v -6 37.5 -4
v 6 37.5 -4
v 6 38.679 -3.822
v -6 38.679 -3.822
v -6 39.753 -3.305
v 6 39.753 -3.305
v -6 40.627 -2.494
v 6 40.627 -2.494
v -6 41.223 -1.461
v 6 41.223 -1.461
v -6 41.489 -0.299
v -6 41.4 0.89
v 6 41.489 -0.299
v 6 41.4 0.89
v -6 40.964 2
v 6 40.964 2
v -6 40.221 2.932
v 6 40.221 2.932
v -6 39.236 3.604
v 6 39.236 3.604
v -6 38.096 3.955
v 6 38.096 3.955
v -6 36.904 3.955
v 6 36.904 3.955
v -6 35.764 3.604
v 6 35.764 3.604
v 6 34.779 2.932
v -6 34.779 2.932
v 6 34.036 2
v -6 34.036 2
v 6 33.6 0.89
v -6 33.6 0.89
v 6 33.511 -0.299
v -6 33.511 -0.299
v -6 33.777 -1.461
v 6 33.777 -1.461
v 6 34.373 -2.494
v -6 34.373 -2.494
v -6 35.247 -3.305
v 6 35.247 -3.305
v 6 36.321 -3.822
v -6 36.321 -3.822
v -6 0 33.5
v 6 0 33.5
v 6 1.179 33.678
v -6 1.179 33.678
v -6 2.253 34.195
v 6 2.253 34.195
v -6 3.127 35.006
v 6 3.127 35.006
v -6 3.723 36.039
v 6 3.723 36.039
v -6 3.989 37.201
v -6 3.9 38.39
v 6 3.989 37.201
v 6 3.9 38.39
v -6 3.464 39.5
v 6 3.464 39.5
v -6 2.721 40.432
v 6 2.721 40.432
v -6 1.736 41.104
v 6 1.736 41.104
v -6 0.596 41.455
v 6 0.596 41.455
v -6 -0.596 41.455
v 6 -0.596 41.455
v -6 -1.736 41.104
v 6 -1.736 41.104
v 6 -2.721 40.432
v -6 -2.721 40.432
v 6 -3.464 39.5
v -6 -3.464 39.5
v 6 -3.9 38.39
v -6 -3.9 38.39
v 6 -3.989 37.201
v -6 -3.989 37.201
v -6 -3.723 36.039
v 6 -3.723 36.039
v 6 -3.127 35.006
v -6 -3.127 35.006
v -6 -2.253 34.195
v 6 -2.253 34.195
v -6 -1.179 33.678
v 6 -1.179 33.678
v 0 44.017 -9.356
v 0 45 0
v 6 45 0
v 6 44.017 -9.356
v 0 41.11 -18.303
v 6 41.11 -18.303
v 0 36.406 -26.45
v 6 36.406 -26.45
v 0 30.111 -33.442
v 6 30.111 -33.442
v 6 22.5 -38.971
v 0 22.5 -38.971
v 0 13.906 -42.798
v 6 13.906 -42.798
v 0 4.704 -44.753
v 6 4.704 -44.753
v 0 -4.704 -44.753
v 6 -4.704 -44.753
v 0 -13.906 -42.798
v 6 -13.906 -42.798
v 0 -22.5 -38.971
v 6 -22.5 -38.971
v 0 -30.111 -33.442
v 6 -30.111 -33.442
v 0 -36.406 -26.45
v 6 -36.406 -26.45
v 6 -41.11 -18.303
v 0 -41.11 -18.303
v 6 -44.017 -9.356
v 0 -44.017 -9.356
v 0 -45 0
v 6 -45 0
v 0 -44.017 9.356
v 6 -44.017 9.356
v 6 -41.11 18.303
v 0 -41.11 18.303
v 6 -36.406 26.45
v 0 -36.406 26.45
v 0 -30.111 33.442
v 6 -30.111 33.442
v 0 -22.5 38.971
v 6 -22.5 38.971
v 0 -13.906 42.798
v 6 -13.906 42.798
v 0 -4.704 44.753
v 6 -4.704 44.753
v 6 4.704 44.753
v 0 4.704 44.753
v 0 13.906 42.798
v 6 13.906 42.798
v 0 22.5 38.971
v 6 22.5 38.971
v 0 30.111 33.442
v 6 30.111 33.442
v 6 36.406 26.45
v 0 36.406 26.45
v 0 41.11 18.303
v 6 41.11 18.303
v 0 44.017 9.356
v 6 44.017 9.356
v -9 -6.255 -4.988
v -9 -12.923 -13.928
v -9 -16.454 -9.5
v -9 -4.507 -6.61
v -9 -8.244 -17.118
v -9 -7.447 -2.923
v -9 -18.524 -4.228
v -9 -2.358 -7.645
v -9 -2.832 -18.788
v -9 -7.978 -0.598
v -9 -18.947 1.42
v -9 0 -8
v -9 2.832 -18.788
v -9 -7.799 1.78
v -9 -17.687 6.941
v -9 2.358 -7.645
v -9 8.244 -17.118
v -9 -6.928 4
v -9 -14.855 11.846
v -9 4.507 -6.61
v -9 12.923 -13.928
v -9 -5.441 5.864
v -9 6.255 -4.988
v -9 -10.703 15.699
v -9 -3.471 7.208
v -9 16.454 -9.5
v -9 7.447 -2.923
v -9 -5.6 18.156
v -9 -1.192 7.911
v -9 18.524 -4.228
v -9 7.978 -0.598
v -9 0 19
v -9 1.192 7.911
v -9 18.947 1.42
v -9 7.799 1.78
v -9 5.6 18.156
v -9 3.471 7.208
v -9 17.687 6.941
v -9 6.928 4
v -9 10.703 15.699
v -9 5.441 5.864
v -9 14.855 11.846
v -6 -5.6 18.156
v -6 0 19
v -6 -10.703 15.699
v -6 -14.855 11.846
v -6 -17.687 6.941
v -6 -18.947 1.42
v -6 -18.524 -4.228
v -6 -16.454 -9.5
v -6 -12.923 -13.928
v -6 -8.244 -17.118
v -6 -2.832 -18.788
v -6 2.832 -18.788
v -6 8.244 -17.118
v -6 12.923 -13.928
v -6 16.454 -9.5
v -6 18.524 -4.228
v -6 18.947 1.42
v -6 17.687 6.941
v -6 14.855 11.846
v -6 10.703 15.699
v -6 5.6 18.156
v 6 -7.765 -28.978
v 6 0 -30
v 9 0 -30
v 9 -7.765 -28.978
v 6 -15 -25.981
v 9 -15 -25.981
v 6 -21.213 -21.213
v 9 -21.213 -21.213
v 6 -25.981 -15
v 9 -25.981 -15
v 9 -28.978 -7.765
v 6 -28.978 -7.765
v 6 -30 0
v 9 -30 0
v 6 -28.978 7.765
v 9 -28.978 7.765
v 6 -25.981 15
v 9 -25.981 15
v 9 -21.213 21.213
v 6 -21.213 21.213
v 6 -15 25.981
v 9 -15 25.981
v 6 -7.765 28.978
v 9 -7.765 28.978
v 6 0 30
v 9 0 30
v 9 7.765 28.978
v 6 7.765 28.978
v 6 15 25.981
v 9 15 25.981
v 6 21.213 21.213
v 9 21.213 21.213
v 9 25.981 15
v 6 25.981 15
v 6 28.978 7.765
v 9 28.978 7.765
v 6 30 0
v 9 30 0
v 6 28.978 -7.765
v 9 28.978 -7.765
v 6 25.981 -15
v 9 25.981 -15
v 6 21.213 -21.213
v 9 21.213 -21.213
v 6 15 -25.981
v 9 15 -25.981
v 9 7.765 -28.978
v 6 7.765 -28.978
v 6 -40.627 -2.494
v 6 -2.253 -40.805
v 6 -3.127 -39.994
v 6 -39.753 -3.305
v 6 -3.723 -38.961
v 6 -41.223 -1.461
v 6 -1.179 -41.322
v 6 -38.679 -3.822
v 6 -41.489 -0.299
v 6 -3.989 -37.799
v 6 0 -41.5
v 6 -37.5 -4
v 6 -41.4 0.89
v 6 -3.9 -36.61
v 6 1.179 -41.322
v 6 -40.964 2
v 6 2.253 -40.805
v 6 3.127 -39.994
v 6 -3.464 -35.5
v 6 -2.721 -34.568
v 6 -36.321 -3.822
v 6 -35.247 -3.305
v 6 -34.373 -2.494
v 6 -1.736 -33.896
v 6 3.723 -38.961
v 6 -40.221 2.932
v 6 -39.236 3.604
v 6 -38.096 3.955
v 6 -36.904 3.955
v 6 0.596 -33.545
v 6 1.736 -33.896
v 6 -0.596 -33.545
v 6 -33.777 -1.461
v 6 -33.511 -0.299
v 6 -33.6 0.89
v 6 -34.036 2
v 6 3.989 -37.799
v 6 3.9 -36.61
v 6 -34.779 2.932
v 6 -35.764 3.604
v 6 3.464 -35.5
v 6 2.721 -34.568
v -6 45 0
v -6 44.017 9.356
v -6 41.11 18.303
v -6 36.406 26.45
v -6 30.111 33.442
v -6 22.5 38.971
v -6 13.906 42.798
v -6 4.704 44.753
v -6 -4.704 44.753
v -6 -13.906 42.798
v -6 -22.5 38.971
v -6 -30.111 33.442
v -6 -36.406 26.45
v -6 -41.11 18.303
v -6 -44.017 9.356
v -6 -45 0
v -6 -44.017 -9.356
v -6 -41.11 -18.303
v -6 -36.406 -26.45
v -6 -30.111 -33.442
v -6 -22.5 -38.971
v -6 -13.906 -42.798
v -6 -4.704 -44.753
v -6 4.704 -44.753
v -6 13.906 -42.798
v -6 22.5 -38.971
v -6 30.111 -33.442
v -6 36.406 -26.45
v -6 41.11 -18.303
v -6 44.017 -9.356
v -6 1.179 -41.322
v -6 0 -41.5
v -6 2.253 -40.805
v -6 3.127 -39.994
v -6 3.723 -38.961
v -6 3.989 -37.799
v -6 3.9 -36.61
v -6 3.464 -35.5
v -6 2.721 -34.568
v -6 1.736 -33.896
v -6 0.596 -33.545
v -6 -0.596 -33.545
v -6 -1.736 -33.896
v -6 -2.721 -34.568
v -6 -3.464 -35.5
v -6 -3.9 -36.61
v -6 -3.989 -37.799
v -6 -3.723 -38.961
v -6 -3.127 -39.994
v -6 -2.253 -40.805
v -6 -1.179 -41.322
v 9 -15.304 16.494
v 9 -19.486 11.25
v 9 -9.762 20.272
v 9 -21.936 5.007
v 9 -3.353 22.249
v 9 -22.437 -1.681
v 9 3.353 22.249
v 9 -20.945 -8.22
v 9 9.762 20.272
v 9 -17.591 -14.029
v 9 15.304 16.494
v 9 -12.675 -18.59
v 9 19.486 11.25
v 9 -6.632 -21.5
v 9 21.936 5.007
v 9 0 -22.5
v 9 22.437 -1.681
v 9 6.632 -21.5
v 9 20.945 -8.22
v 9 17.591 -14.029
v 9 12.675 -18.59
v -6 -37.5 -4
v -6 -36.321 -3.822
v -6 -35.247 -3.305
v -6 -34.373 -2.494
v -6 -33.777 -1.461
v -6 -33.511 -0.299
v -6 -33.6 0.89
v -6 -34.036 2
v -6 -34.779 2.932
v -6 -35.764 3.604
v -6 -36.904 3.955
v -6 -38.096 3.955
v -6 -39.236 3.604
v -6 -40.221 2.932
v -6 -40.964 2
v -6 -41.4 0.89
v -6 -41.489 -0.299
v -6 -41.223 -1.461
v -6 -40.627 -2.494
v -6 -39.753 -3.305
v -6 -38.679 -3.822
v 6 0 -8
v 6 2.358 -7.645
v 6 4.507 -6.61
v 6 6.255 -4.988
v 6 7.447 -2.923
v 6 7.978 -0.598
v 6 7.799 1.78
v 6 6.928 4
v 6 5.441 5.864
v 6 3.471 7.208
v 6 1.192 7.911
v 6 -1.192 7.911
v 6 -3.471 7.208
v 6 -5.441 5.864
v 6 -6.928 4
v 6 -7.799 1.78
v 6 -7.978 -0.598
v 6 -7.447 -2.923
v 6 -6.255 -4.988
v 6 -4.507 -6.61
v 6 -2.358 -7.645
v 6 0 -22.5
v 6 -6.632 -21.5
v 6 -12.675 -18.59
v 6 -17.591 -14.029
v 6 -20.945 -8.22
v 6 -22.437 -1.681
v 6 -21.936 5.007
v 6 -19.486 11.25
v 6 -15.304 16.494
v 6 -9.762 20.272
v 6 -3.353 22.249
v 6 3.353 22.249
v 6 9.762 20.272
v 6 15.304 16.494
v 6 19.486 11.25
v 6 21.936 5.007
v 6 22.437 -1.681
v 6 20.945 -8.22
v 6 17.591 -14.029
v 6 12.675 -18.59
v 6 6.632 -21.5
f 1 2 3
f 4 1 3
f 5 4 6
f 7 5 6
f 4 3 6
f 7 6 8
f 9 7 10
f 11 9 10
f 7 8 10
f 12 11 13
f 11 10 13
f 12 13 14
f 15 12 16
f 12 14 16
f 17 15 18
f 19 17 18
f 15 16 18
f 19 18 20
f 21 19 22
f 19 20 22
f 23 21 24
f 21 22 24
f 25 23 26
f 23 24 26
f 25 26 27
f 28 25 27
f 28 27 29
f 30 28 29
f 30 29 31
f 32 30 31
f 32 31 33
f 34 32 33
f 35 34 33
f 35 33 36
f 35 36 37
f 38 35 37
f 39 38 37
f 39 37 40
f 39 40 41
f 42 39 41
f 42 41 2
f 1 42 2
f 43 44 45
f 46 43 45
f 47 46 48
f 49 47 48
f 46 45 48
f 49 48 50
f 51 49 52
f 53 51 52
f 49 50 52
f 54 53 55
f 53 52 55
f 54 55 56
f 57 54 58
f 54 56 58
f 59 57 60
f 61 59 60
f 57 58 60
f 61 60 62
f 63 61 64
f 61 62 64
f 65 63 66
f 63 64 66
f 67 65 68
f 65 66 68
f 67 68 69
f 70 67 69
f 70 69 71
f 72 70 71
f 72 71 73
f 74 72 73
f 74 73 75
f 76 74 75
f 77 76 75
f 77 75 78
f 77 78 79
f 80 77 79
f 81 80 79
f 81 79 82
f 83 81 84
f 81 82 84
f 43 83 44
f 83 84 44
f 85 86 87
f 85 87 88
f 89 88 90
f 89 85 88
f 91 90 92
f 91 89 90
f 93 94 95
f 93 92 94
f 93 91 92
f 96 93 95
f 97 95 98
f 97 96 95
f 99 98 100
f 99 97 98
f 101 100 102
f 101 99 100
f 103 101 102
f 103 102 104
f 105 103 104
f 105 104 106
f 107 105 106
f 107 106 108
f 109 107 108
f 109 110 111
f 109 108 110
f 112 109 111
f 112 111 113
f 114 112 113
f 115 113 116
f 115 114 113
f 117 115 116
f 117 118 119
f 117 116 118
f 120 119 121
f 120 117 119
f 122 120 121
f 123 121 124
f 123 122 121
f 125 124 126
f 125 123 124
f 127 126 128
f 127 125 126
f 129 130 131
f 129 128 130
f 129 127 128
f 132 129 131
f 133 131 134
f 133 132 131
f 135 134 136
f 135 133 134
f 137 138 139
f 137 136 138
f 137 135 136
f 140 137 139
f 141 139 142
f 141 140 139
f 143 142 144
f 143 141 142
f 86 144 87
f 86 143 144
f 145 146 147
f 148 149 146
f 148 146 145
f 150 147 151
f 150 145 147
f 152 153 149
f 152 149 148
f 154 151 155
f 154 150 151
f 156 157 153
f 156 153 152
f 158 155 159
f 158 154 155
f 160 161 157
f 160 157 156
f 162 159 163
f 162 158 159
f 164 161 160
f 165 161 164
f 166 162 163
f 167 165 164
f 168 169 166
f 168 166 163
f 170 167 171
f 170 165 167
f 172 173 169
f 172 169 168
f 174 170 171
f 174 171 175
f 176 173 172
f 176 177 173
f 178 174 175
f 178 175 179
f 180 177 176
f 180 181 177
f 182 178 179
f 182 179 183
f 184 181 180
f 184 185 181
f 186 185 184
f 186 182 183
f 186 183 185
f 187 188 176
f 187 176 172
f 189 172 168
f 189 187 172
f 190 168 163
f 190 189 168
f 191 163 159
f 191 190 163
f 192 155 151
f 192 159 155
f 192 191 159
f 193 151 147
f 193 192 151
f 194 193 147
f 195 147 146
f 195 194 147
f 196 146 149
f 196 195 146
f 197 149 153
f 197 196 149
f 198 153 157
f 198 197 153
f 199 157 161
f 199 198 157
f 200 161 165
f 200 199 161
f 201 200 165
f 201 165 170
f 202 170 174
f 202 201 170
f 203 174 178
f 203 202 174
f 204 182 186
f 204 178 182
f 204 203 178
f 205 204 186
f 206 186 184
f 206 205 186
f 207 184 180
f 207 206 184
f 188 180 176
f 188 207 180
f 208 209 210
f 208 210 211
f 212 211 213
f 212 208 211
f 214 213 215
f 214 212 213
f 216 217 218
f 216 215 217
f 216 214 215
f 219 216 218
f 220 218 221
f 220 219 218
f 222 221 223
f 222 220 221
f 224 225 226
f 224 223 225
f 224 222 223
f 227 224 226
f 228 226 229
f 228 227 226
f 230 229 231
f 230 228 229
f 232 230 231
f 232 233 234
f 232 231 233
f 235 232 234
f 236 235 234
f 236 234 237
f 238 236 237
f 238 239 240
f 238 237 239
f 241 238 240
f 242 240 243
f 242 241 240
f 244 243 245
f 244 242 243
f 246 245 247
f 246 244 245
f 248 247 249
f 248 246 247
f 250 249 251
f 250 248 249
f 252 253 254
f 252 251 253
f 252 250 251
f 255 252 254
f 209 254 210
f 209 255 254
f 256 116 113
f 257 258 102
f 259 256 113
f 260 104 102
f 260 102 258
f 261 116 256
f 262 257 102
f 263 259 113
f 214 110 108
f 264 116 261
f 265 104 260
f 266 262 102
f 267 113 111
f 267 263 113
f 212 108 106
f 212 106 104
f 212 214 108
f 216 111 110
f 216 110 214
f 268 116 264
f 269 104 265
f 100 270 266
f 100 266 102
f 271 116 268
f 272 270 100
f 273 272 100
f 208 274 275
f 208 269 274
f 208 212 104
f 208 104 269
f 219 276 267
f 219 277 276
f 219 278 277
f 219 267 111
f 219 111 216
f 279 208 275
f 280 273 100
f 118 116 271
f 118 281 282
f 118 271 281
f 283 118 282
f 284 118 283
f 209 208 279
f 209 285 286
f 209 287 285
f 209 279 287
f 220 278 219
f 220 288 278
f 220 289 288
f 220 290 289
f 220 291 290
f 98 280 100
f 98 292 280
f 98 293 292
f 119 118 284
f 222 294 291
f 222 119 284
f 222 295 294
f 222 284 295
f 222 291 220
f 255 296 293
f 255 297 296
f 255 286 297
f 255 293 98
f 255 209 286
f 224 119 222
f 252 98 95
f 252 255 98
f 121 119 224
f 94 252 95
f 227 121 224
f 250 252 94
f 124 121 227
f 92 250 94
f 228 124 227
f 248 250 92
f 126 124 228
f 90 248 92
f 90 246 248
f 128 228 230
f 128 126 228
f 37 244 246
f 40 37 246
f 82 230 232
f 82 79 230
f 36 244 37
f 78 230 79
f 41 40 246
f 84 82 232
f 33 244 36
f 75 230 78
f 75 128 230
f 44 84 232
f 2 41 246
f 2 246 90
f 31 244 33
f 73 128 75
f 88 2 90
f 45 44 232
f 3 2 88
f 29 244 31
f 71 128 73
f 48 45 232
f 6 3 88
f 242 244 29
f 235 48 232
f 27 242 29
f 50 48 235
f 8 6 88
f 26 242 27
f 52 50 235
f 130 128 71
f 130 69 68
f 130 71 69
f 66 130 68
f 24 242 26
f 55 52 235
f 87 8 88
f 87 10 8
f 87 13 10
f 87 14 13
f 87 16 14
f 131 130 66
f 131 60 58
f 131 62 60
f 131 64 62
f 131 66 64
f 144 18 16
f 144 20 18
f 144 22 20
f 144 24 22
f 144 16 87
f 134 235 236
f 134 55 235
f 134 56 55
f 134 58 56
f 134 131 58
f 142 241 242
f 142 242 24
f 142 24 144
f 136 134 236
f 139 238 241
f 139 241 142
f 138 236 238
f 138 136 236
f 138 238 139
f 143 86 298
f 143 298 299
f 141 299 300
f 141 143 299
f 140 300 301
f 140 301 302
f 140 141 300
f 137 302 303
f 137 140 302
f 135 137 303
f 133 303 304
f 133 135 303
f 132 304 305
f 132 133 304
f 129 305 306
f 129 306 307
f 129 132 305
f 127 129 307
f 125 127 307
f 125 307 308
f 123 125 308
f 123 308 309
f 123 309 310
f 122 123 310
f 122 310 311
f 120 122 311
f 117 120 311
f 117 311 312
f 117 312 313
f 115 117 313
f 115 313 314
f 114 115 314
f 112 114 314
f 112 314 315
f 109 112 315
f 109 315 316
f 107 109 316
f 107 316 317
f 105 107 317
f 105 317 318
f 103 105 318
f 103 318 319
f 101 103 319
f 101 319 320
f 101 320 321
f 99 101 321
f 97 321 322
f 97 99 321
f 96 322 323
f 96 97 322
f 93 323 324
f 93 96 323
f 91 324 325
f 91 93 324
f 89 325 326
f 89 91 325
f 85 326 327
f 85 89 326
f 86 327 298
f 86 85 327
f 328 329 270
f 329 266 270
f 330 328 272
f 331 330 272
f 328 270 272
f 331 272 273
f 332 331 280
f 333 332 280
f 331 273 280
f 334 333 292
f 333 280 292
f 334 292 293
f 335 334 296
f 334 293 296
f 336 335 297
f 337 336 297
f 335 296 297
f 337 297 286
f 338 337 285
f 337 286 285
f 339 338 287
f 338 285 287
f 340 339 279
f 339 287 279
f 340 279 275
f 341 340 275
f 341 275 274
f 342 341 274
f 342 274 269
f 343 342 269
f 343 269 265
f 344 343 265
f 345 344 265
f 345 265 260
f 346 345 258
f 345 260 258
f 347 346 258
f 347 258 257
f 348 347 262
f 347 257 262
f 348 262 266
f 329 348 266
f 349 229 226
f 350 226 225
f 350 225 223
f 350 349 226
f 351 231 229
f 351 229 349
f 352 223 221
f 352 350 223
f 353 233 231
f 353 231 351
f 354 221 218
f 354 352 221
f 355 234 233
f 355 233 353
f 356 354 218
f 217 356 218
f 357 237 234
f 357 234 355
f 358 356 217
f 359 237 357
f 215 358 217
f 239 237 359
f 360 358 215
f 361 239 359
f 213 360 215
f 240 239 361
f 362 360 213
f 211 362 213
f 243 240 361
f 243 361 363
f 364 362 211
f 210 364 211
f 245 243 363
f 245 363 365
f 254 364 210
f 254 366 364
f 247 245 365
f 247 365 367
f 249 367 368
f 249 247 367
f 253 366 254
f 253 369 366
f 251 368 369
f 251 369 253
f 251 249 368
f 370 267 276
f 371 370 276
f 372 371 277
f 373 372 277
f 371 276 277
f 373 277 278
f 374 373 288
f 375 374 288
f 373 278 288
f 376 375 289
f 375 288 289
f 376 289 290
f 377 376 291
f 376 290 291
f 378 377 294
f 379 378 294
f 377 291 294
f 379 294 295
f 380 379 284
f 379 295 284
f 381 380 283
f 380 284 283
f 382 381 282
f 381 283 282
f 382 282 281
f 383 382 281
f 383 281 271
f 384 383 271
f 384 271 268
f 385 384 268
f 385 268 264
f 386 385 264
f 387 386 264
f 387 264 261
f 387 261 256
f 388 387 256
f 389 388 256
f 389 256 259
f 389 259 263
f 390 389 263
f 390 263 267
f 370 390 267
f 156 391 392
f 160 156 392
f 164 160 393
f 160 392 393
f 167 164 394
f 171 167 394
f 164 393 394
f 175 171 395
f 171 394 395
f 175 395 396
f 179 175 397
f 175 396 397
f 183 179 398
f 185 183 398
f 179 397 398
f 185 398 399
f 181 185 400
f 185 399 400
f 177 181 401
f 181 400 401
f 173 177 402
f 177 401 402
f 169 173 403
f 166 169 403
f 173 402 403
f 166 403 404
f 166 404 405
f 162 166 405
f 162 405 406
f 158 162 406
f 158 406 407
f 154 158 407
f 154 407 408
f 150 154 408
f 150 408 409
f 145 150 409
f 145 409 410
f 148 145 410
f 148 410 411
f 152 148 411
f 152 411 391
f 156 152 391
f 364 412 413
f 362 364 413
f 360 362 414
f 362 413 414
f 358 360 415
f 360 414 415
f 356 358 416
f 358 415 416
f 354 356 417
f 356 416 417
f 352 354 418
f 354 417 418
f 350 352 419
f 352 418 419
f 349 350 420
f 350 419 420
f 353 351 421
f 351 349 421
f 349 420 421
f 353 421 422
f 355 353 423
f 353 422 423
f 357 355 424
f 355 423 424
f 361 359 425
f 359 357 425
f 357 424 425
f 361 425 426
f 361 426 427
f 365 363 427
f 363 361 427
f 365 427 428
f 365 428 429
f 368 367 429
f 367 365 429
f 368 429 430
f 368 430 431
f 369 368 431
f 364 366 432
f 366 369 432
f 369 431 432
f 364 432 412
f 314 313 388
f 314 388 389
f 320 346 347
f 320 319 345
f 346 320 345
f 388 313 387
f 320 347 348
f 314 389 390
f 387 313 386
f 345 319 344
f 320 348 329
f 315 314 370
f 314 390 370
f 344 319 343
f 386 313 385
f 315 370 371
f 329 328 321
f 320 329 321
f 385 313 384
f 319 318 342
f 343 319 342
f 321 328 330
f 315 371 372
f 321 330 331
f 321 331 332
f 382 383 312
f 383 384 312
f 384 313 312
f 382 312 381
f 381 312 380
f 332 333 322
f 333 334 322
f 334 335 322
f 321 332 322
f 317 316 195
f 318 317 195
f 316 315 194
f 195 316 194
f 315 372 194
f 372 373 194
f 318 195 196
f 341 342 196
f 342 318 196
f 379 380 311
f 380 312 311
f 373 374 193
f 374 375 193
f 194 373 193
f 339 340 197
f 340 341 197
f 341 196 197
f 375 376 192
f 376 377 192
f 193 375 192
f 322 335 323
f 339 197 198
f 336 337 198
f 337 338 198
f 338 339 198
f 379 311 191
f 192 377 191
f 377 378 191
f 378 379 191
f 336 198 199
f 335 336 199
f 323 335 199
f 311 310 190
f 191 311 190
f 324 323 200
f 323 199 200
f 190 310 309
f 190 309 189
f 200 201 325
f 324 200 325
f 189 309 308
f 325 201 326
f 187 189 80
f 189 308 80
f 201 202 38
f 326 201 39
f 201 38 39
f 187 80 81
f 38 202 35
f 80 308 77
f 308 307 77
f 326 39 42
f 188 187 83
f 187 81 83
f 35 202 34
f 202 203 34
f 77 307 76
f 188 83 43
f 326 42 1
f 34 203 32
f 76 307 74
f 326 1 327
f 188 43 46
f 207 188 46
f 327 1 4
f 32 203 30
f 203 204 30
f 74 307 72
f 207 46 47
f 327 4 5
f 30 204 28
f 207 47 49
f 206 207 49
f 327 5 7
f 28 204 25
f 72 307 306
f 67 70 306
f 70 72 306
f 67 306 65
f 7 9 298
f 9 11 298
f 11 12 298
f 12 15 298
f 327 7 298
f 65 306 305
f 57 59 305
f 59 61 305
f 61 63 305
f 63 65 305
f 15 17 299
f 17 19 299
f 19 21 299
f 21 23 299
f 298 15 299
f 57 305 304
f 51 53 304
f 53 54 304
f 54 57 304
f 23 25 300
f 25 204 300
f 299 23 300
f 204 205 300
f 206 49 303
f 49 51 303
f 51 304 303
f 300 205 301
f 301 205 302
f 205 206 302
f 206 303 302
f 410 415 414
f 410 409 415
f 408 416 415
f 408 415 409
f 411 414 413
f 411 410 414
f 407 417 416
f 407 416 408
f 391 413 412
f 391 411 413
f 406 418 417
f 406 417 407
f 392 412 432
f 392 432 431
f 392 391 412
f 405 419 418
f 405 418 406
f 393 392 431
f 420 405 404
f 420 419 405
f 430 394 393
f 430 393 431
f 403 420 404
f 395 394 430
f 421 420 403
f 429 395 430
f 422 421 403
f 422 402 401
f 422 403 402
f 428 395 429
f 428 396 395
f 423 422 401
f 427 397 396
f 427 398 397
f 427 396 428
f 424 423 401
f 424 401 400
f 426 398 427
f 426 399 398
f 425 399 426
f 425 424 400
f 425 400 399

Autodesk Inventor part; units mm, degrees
ref_plane "YZ Plane" through (0, 0, 0) normal (1, 0, 0) x (0, 1, 0)
ref_plane "XZ Plane" through (0, 0, 0) normal (0, 1, 0) x (-1, 0, 0)
ref_plane "XY Plane" through (0, 0, 0) normal (0, 0, 1) x (1, 0, 0)
sketch "Sketch1" plane through (0, 0, 0) normal (1, 0, 0) x (0, 1, 0)
  circle A0 centre (0, 0) radius 45
  dimension "d0" = 90
extrude "Extrusion1" add sketch "Sketch1" along normal mid plane 12
sketch "Sketch2" plane through (6, 0, 0) normal (1, 0, 0) x (0, 0, -1)
  circle A0 centre (0, 0) radius 30
  circle A1 centre (0, 0) radius 22.5
  dimension "d3" = 60
  dimension "d4" = 45
extrude "Extrusion2" add sketch "Sketch2" along normal blind 3
sketch "Sketch3" plane through (-6, 0, 0) normal (-1, 0, 0) x (0, 0, 1)
  circle A0 centre (0, 0) radius 19
  dimension "d7" = 38
extrude "Extrusion3" add sketch "Sketch3" along normal blind 3
sketch "Sketch4" plane through (6, 0, 0) normal (1, 0, 0) x (0, 0, -1)
  circle A0 centre (0, 0) radius 8
  circle A1 centre (0, 37.5) radius 4
  circle A2 centre (-37.5, 0) radius 4
  circle A3 centre (0, -37.5) radius 4
  circle A4 centre (37.5, 0) radius 4
  dimension "d10" = 16
  dimension "d11" = 8
  dimension "d12" = 37.5
  dimension "d15" = 360
  dimension "d17" = 75
  dimension "d18" = 37.5
extrude "Extrusion4" cut sketch "Sketch4" against normal through all
